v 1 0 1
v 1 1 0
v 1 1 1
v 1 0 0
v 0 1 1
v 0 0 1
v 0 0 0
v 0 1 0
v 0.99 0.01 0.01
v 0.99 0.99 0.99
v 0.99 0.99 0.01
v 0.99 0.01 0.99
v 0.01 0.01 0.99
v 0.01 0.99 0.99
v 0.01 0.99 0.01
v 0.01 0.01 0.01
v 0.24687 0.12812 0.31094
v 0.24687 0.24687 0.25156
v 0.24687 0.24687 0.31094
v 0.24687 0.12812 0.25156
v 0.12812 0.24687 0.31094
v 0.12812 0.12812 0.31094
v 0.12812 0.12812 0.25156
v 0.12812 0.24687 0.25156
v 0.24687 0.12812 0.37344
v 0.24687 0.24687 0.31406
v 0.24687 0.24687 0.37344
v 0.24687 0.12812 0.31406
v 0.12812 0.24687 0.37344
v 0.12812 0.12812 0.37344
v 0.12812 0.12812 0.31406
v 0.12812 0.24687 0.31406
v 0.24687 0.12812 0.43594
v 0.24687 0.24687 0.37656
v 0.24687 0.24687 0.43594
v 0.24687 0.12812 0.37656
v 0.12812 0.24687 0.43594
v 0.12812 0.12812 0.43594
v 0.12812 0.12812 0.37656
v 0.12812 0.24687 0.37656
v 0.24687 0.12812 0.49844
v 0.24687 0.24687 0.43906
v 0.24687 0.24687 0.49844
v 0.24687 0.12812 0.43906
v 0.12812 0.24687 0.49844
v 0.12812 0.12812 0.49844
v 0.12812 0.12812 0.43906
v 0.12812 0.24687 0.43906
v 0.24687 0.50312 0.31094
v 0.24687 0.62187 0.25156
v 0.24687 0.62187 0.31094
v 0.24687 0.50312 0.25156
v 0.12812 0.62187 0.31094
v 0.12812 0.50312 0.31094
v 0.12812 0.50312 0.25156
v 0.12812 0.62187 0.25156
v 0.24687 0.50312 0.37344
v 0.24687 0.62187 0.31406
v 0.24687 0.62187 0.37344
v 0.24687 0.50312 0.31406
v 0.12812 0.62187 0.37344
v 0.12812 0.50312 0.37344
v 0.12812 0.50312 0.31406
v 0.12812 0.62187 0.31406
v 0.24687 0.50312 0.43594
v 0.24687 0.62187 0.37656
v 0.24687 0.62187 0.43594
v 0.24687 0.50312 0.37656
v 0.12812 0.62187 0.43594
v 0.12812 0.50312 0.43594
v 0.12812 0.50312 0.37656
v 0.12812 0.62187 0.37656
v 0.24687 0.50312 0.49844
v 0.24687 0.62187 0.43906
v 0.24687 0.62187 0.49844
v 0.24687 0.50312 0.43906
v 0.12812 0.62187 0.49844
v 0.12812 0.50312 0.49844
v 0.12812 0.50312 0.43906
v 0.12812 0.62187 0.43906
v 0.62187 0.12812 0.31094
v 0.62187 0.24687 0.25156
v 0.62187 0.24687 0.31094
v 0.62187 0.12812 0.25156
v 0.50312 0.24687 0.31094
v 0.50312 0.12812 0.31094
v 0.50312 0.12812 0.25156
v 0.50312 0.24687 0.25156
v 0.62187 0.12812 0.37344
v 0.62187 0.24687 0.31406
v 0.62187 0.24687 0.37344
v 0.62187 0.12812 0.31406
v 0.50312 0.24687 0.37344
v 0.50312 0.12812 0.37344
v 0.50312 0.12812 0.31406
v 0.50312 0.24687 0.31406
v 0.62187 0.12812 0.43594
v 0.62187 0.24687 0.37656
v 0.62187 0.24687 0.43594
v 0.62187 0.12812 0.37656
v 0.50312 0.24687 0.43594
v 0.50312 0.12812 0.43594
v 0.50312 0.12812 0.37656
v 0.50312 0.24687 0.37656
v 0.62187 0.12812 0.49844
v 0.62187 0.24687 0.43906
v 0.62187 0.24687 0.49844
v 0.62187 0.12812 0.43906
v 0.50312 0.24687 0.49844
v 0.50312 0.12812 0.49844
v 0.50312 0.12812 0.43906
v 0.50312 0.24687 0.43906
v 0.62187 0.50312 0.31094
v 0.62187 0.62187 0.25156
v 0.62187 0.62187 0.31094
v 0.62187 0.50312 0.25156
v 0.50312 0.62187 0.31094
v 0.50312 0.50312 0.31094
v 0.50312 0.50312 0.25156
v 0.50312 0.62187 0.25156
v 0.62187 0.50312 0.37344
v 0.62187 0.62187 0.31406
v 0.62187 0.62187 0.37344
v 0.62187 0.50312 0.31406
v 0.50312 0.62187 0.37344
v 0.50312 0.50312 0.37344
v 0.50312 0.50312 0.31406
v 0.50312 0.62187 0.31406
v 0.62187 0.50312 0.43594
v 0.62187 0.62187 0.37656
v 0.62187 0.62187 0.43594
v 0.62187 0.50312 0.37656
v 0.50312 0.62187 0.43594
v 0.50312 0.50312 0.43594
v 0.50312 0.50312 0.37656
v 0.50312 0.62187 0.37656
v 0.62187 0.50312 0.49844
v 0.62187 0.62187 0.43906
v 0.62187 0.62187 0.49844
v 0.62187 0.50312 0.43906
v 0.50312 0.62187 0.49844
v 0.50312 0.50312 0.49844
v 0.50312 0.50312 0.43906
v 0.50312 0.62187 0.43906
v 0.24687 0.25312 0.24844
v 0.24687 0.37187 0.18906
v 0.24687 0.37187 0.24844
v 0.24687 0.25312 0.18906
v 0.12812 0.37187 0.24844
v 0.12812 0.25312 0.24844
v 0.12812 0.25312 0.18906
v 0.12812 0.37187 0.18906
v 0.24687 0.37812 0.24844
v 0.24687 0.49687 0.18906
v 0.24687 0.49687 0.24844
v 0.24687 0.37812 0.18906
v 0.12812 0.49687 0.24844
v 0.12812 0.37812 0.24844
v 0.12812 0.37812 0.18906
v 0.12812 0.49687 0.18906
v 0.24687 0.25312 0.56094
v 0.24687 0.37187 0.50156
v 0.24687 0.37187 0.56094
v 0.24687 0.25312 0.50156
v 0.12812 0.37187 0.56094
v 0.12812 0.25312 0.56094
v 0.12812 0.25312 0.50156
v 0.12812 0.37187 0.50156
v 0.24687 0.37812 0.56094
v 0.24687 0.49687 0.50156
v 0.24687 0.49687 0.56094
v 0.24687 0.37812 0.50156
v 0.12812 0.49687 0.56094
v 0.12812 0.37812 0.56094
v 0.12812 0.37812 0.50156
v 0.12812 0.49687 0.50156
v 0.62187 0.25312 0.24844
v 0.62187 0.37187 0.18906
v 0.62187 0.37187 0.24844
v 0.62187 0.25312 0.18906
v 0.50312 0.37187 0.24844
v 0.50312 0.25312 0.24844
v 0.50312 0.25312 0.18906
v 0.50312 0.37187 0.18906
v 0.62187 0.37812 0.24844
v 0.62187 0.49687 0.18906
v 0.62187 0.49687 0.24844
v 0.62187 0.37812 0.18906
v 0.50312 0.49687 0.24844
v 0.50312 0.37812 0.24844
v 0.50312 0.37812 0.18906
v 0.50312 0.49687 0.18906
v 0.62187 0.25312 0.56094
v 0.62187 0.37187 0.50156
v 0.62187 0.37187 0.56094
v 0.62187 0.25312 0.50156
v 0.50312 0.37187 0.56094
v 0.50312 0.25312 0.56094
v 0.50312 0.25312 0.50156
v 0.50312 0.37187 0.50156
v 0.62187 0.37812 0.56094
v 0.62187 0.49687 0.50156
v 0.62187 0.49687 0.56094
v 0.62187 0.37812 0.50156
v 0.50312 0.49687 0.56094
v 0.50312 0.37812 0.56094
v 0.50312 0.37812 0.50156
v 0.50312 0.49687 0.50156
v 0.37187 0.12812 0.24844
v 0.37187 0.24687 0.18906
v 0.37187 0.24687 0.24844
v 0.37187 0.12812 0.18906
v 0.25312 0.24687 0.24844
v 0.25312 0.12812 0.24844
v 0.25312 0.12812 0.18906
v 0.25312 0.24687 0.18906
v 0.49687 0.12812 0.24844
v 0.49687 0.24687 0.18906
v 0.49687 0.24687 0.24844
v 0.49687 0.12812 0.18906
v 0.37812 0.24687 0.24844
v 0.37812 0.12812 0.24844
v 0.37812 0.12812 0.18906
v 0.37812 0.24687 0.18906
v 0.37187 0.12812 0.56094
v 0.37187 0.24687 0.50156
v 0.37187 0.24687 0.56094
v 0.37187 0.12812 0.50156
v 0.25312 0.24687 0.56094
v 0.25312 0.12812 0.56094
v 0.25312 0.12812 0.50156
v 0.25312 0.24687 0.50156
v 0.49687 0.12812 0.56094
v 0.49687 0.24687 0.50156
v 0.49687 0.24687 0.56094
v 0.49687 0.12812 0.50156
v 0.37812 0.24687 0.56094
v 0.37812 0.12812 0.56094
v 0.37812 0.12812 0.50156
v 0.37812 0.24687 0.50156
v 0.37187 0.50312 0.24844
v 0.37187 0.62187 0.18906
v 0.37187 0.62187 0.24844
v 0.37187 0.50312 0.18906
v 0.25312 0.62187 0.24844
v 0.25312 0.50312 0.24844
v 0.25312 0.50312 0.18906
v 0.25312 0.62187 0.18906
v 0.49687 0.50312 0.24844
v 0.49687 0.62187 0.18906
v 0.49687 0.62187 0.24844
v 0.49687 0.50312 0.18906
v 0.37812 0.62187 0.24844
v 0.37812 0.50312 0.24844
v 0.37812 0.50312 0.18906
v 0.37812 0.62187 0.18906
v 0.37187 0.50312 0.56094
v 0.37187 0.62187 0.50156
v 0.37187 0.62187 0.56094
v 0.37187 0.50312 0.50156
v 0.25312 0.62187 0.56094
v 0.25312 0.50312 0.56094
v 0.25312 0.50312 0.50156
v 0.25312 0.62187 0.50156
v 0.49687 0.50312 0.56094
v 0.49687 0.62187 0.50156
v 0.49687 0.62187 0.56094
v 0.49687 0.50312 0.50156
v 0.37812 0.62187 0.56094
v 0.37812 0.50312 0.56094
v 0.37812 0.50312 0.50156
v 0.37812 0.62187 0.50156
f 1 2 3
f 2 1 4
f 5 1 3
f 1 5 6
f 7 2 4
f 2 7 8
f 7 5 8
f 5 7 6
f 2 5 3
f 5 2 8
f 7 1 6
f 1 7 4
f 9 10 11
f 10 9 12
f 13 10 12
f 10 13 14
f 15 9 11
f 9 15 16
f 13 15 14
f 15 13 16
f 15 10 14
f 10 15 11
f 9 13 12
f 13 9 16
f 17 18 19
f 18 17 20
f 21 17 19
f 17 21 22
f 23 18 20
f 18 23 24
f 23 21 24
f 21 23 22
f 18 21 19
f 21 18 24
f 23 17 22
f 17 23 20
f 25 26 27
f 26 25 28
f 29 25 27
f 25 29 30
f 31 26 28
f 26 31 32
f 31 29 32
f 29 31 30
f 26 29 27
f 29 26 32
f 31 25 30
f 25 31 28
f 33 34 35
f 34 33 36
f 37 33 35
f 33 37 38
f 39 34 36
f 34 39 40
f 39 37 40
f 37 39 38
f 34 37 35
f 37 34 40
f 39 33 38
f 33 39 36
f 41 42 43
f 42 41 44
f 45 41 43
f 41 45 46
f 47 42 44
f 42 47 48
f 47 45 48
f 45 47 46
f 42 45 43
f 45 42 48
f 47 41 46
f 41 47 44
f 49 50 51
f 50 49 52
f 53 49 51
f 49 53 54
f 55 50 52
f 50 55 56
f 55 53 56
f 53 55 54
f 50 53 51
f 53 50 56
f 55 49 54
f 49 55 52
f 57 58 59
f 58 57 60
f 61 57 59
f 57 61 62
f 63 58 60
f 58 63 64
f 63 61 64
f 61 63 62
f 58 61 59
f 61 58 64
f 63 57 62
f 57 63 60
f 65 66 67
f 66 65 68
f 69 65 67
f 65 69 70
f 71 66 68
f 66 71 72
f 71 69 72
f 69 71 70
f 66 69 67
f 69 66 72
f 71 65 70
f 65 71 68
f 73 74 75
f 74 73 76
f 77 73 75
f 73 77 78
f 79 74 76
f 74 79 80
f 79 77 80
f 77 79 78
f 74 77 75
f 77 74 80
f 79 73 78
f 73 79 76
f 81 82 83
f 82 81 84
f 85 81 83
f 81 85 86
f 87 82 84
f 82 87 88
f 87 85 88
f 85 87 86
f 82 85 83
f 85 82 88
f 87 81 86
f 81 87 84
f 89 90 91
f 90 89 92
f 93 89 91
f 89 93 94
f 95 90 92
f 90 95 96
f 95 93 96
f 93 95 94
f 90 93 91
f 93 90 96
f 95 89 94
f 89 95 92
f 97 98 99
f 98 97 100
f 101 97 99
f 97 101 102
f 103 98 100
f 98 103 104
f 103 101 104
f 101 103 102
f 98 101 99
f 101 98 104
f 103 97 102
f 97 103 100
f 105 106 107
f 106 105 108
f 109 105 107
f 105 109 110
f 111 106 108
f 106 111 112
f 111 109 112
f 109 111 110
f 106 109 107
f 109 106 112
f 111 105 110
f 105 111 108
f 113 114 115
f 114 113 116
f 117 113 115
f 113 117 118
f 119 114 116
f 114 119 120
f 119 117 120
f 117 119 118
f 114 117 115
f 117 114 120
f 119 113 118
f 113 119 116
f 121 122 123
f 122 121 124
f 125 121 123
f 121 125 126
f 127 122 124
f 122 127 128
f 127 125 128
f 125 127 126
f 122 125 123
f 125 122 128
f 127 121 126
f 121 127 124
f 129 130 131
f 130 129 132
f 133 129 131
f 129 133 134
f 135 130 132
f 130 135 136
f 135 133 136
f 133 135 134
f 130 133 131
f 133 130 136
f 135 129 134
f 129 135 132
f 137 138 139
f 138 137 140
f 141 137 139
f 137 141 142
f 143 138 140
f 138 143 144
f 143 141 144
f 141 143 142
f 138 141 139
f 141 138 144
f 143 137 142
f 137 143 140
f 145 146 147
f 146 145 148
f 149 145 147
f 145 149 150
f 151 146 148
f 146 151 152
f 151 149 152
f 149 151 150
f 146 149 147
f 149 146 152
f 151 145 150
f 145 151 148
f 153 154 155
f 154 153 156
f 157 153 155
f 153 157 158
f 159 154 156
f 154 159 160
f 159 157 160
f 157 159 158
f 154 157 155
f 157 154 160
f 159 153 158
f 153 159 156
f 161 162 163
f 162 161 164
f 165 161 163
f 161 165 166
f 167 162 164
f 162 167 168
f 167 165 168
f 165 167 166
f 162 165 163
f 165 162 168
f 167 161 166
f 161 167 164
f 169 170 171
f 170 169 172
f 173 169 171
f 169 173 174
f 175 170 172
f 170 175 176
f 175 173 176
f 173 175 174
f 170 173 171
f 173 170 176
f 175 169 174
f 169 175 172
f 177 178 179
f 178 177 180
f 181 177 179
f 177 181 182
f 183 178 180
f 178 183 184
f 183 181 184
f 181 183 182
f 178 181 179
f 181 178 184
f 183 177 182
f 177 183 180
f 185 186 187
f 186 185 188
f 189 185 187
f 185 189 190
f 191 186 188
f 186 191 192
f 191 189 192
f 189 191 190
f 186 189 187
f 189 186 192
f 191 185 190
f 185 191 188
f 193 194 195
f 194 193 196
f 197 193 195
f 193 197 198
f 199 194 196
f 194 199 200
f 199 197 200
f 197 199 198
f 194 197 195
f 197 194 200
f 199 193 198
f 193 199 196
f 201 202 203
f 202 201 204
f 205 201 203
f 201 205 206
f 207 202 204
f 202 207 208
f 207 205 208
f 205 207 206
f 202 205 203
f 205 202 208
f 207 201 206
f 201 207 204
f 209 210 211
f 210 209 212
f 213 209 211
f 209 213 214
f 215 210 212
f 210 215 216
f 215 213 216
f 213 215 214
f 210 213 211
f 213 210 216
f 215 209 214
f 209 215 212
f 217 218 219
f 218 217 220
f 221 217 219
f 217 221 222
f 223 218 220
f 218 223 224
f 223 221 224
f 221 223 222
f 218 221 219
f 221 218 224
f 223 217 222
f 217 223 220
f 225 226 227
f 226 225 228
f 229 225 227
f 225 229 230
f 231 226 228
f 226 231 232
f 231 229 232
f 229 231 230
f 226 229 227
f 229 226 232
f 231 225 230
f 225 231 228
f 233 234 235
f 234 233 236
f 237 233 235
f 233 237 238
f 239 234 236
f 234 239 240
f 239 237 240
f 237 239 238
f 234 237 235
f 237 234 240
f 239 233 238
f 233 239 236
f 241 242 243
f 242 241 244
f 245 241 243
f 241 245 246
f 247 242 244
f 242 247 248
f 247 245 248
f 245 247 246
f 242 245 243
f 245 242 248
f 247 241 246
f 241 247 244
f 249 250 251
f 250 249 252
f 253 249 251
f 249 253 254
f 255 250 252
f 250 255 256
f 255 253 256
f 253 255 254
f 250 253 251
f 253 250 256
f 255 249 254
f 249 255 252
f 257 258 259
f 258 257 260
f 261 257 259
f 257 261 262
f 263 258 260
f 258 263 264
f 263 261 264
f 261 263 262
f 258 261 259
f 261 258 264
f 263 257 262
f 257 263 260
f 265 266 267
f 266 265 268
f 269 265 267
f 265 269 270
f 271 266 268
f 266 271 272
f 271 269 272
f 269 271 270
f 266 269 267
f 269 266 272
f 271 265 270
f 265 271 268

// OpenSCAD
translate([0.1875, 0.1875, 0.28125]) color([0.703054380060215, 0.20992958504086667, 0.33841921728721336]) cube([0.11875, 0.11875, 0.059375], center=true);
translate([0.1875, 0.1875, 0.34375]) color([0.42960497970262457, 0.25698226473411734, 0.07001190804204127]) cube([0.11875, 0.11875, 0.059375], center=true);
translate([0.1875, 0.1875, 0.40625]) color([0.3153506683529538, 0.6301582501564637, 0.19774628373595748]) cube([0.11875, 0.11875, 0.059375], center=true);
translate([0.1875, 0.1875, 0.46875]) color([0.09496208096918546, 0.10298507682314673, 0.650888360068781]) cube([0.11875, 0.11875, 0.059375], center=true);
translate([0.1875, 0.5625, 0.28125]) color([0.6427717485589954, 0.7859258803293684, 0.5634316375329904]) cube([0.11875, 0.11875, 0.059375], center=true);
translate([0.1875, 0.5625, 0.34375]) color([0.7064657770377251, 0.07176839346637265, 0.14595943559738866]) cube([0.11875, 0.11875, 0.059375], center=true);
translate([0.1875, 0.5625, 0.40625]) color([0.12013134158733763, 0.5412019676577784, 0.38921252073737345]) cube([0.11875, 0.11875, 0.059375], center=true);
translate([0.1875, 0.5625, 0.46875]) color([0.00040509426762636025, 0.4605585243748366, 0.6981931088396868]) cube([0.11875, 0.11875, 0.059375], center=true);
translate([0.5625, 0.1875, 0.28125]) color([0.9762309674680956, 0.050288189665079086, 0.7361846940327719]) cube([0.11875, 0.11875, 0.059375], center=true);
translate([0.5625, 0.1875, 0.34375]) color([0.0013417196139966503, 0.09522804028962906, 0.12160609965727565]) cube([0.11875, 0.11875, 0.059375], center=true);
translate([0.5625, 0.1875, 0.40625]) color([0.3260158537165945, 0.8431499912656578, 0.5144302217539258]) cube([0.11875, 0.11875, 0.059375], center=true);
translate([0.5625, 0.1875, 0.46875]) color([0.060757025301725776, 0.04773733263955382, 0.11811561202689269]) cube([0.11875, 0.11875, 0.059375], center=true);
translate([0.5625, 0.5625, 0.28125]) color([0.20780756227208397, 0.9368197235121758, 0.3361562411351813]) cube([0.11875, 0.11875, 0.059375], center=true);
translate([0.5625, 0.5625, 0.34375]) color([0.465638658600374, 0.3754578607174176, 0.4034626637854042]) cube([0.11875, 0.11875, 0.059375], center=true);
translate([0.5625, 0.5625, 0.40625]) color([0.8945883809617231, 0.5944107536423664, 0.10616251349203187]) cube([0.11875, 0.11875, 0.059375], center=true);
translate([0.5625, 0.5625, 0.46875]) color([0.8759843857195714, 0.2056853714522987, 0.34594334284937]) cube([0.11875, 0.11875, 0.059375], center=true);
translate([0.1875, 0.3125, 0.21875]) color([0.3113729683182376, 0.6036711379618434, 0.005931864077300064]) cube([0.11875, 0.11875, 0.059375], center=true);
translate([0.1875, 0.4375, 0.21875]) color([0.6972025462806639, 0.46558897864501314, 0.5575798636075375]) cube([0.11875, 0.11875, 0.059375], center=true);
translate([0.1875, 0.3125, 0.53125]) color([0.11520756000002208, 0.516286709629444, 0.6382062165021002]) cube([0.11875, 0.11875, 0.059375], center=true);
translate([0.1875, 0.4375, 0.53125]) color([0.2607785909664502, 0.7750396797832314, 0.1161652239369676]) cube([0.11875, 0.11875, 0.059375], center=true);
translate([0.5625, 0.3125, 0.21875]) color([0.5700686193458527, 0.5968241185439861, 0.5243112480728881]) cube([0.11875, 0.11875, 0.059375], center=true);
translate([0.5625, 0.4375, 0.21875]) color([0.5393707290133992, 0.5442778936618471, 0.9829311212669636]) cube([0.11875, 0.11875, 0.059375], center=true);
translate([0.5625, 0.3125, 0.53125]) color([0.6964432346782894, 0.8219042618362917, 0.5025246996287378]) cube([0.11875, 0.11875, 0.059375], center=true);
translate([0.5625, 0.4375, 0.53125]) color([0.09670184687739147, 0.3318074253451102, 0.018609265682591913]) cube([0.11875, 0.11875, 0.059375], center=true);
translate([0.3125, 0.1875, 0.21875]) color([0.31870386564594533, 0.2800075869469455, 0.28641816972874345]) cube([0.11875, 0.11875, 0.059375], center=true);
translate([0.4375, 0.1875, 0.21875]) color([0.18799282636139913, 0.6641342368962622, 0.49058612042122685]) cube([0.11875, 0.11875, 0.059375], center=true);
translate([0.3125, 0.1875, 0.53125]) color([0.1092379207551033, 0.31663963114650095, 0.7477409280317969]) cube([0.11875, 0.11875, 0.059375], center=true);
translate([0.4375, 0.1875, 0.53125]) color([0.8754625369318775, 0.0906491039740015, 0.9262395306917688]) cube([0.11875, 0.11875, 0.059375], center=true);
translate([0.3125, 0.5625, 0.21875]) color([0.15100272253558655, 0.4702247918580028, 0.14186017534919737]) cube([0.11875, 0.11875, 0.059375], center=true);
translate([0.4375, 0.5625, 0.21875]) color([0.6225175736814758, 0.2775258699410026, 0.20094461029976696]) cube([0.11875, 0.11875, 0.059375], center=true);
translate([0.3125, 0.5625, 0.53125]) color([0.3122299092706248, 0.4233465212155666, 0.9966907991567827]) cube([0.11875, 0.11875, 0.059375], center=true);
translate([0.4375, 0.5625, 0.53125]) color([0.5543553319808279, 0.4973761268707887, 0.2238063295128634]) cube([0.11875, 0.11875, 0.059375], center=true);
color([0.3,0.3,0.3,0.3]) difference() { cube([1,1,1]); translate([0.01,0.01,0.01]) cube([0.98,0.98,0.98]); }
